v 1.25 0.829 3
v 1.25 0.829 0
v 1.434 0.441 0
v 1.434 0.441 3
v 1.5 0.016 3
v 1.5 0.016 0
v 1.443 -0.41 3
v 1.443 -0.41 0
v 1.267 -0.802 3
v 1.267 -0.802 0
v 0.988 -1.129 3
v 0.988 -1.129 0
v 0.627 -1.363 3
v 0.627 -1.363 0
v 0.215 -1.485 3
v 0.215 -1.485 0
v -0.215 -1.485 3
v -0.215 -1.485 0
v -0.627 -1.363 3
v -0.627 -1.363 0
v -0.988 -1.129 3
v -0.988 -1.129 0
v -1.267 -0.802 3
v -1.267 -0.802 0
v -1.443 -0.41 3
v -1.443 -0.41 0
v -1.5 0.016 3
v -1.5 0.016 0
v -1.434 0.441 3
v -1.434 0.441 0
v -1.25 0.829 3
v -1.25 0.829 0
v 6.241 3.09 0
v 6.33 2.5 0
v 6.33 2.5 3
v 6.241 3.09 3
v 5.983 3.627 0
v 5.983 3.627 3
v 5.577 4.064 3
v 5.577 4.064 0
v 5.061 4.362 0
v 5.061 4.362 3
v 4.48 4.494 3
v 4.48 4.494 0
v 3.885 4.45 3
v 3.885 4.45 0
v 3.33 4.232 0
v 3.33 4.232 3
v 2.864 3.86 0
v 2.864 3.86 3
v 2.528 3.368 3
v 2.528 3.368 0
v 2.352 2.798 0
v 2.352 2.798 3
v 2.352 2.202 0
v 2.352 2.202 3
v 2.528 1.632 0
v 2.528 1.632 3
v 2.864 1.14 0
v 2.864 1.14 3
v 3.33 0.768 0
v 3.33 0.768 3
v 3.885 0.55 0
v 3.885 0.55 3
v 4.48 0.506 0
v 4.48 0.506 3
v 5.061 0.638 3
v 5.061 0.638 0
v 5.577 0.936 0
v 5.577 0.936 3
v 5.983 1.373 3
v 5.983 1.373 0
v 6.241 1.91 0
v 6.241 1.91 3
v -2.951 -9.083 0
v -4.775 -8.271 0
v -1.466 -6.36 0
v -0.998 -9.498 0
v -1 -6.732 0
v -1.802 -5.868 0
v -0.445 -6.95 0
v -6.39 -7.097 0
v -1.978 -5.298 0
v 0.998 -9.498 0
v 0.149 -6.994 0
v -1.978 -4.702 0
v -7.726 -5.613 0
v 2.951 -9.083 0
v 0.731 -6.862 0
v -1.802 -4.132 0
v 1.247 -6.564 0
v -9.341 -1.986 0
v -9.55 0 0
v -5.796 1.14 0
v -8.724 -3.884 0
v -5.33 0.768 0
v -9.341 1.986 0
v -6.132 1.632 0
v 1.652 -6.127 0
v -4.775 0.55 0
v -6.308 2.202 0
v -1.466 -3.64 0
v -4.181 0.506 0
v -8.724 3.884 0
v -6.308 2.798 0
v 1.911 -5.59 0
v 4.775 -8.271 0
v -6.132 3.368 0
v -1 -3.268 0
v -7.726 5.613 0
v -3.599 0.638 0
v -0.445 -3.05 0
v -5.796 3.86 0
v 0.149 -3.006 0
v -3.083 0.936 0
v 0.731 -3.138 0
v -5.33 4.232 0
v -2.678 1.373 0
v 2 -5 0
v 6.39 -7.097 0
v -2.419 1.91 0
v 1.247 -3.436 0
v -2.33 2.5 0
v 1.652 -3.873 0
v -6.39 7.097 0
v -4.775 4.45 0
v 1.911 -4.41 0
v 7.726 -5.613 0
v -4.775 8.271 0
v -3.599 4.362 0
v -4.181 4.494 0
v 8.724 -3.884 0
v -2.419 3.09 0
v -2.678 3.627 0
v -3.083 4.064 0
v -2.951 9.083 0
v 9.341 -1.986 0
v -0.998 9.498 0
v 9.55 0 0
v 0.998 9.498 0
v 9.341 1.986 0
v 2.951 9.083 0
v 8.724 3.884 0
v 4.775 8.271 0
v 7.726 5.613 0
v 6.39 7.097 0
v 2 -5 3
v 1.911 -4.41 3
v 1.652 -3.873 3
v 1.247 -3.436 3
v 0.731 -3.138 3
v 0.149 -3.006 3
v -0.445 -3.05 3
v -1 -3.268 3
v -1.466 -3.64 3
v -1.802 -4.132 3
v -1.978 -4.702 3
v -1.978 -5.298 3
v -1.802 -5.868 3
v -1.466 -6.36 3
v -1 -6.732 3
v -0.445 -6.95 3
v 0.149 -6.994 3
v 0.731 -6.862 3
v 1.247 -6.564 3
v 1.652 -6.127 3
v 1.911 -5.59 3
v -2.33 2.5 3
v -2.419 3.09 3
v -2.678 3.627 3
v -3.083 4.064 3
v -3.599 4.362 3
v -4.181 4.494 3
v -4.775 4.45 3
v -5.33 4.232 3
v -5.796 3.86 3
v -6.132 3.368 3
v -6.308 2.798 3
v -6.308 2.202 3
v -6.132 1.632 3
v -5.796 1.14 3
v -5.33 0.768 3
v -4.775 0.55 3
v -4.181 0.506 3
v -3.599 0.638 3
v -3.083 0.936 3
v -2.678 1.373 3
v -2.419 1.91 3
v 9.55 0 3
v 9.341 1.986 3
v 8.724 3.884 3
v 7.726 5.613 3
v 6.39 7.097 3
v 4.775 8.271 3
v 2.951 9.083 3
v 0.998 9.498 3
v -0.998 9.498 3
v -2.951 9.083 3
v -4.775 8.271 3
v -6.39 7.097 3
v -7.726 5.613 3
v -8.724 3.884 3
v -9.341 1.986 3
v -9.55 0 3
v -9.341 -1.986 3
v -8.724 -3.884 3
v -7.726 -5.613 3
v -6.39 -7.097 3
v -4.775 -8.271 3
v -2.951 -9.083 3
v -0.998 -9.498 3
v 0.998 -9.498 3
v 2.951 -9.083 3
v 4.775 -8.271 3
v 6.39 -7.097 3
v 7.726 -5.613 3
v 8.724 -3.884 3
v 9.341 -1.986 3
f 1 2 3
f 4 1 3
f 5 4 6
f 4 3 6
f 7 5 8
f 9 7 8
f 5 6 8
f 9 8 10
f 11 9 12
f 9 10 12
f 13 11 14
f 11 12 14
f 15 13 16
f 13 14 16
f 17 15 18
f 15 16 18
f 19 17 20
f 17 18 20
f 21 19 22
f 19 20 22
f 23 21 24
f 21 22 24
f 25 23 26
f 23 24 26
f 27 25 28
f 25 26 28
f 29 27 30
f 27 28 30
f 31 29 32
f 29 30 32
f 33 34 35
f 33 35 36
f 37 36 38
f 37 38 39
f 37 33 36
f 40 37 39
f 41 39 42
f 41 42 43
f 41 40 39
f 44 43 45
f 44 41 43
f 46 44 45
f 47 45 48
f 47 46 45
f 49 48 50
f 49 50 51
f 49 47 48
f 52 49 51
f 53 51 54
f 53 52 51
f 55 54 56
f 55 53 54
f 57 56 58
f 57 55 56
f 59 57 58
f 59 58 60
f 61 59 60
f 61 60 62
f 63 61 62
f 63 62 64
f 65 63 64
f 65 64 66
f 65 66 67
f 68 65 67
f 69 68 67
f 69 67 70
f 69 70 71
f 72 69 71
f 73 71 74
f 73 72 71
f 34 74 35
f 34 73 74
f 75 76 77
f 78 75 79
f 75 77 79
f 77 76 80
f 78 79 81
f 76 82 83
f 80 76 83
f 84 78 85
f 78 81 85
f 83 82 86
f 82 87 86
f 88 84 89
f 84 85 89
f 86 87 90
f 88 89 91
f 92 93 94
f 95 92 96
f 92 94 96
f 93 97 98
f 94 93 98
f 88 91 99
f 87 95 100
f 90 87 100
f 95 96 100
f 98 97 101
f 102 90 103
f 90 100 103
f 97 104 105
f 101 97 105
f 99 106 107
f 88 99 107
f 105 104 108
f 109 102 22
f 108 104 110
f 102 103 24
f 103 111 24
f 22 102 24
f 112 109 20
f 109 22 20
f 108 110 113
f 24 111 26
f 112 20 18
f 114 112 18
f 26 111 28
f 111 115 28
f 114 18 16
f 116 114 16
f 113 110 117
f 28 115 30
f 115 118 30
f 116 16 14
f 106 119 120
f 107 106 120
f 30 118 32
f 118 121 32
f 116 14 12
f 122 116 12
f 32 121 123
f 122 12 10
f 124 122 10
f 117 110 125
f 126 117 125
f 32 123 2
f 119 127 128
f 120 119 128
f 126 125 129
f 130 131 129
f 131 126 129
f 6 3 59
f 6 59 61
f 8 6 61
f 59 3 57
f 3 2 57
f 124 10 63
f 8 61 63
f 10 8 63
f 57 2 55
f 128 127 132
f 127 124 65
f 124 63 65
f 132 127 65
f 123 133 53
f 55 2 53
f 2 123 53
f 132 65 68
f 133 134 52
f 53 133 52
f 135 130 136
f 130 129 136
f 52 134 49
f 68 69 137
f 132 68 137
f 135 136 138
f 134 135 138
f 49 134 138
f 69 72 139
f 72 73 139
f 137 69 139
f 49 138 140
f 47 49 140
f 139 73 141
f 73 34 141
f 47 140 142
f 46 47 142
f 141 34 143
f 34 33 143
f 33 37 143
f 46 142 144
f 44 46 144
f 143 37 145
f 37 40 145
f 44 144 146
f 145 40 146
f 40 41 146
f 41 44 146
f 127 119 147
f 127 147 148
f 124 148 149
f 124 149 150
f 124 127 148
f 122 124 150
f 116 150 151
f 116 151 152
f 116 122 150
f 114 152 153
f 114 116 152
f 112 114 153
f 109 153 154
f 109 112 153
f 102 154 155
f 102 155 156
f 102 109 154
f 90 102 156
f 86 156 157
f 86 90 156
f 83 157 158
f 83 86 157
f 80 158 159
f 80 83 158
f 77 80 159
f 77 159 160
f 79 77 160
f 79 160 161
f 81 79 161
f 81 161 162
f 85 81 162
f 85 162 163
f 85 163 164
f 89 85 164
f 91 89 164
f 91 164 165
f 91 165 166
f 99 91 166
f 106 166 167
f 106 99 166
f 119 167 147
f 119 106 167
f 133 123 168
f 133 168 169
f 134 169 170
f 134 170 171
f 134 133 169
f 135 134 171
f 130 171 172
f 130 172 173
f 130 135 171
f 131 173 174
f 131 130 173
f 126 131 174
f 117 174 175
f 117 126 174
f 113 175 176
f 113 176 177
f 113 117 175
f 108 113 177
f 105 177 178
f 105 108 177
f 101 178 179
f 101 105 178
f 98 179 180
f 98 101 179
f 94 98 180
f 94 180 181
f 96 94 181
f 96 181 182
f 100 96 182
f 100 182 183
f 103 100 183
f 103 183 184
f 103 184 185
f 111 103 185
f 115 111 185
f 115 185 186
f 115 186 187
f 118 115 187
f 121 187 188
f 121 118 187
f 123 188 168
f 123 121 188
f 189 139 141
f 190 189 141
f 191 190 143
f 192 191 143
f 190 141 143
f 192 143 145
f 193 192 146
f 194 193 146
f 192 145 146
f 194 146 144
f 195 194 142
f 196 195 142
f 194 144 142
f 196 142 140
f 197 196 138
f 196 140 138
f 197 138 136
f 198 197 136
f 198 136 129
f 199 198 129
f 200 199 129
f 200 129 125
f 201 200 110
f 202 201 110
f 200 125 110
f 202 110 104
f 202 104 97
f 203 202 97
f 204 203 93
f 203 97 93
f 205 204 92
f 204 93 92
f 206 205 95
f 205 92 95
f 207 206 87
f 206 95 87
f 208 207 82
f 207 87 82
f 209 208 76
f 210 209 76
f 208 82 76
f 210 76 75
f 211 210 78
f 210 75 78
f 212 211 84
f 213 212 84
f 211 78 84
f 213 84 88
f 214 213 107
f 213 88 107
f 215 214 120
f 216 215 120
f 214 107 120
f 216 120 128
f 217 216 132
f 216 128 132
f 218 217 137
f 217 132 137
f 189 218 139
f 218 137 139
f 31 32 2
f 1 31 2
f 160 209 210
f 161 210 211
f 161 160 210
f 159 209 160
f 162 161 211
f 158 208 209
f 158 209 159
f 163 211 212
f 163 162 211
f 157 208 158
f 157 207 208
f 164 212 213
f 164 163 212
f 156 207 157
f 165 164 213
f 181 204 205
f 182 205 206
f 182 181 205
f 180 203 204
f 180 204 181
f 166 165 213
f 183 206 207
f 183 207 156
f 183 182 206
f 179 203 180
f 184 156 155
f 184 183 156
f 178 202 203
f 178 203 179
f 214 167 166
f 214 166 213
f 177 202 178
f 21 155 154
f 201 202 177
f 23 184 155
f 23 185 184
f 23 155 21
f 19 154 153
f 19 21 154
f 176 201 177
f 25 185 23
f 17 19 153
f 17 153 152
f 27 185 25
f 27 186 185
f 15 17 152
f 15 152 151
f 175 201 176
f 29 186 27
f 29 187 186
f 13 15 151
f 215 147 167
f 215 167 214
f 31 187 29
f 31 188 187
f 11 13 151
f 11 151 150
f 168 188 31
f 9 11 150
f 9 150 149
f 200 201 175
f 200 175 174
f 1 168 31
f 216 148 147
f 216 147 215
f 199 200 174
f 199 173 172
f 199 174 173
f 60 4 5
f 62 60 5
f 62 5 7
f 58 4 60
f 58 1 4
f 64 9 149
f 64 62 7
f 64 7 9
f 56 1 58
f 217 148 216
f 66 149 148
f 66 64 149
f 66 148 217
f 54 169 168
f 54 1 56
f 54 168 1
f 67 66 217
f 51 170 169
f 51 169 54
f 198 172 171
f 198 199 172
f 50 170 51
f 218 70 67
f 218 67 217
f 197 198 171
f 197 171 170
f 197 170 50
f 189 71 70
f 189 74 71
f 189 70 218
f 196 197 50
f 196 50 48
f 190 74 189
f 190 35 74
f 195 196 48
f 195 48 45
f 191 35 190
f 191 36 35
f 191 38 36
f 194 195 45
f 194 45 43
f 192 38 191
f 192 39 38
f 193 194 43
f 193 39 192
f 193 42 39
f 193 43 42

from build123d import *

# Parameters (mm, degrees)
SKETCH1_R           = 9.55
SKETCH1_R_2         = 2
BOSS_EXTRUDE1_DEPTH = 3


with BuildPart() as part:
    # Sketch1 → Boss-Extrude1 (new body)
    with BuildSketch(Plane.XY):
        Circle(SKETCH1_R)
        with BuildLine():
            Line((-1.25, 0.829156198), (1.25, 0.829156198))
            ThreePointArc((1.25, 0.829156198), (0, -1.5), (-1.25, 0.829156198))
        make_face(mode=Mode.SUBTRACT)
        with Locations((0, -5)):
            Circle(SKETCH1_R_2, mode=Mode.SUBTRACT)
        with Locations((-4.330127019, 2.5)):
            Circle(SKETCH1_R_2, mode=Mode.SUBTRACT)
        with Locations((4.330127019, 2.5)):
            Circle(SKETCH1_R_2, mode=Mode.SUBTRACT)
    extrude(amount=BOSS_EXTRUDE1_DEPTH)


solid = part.part
